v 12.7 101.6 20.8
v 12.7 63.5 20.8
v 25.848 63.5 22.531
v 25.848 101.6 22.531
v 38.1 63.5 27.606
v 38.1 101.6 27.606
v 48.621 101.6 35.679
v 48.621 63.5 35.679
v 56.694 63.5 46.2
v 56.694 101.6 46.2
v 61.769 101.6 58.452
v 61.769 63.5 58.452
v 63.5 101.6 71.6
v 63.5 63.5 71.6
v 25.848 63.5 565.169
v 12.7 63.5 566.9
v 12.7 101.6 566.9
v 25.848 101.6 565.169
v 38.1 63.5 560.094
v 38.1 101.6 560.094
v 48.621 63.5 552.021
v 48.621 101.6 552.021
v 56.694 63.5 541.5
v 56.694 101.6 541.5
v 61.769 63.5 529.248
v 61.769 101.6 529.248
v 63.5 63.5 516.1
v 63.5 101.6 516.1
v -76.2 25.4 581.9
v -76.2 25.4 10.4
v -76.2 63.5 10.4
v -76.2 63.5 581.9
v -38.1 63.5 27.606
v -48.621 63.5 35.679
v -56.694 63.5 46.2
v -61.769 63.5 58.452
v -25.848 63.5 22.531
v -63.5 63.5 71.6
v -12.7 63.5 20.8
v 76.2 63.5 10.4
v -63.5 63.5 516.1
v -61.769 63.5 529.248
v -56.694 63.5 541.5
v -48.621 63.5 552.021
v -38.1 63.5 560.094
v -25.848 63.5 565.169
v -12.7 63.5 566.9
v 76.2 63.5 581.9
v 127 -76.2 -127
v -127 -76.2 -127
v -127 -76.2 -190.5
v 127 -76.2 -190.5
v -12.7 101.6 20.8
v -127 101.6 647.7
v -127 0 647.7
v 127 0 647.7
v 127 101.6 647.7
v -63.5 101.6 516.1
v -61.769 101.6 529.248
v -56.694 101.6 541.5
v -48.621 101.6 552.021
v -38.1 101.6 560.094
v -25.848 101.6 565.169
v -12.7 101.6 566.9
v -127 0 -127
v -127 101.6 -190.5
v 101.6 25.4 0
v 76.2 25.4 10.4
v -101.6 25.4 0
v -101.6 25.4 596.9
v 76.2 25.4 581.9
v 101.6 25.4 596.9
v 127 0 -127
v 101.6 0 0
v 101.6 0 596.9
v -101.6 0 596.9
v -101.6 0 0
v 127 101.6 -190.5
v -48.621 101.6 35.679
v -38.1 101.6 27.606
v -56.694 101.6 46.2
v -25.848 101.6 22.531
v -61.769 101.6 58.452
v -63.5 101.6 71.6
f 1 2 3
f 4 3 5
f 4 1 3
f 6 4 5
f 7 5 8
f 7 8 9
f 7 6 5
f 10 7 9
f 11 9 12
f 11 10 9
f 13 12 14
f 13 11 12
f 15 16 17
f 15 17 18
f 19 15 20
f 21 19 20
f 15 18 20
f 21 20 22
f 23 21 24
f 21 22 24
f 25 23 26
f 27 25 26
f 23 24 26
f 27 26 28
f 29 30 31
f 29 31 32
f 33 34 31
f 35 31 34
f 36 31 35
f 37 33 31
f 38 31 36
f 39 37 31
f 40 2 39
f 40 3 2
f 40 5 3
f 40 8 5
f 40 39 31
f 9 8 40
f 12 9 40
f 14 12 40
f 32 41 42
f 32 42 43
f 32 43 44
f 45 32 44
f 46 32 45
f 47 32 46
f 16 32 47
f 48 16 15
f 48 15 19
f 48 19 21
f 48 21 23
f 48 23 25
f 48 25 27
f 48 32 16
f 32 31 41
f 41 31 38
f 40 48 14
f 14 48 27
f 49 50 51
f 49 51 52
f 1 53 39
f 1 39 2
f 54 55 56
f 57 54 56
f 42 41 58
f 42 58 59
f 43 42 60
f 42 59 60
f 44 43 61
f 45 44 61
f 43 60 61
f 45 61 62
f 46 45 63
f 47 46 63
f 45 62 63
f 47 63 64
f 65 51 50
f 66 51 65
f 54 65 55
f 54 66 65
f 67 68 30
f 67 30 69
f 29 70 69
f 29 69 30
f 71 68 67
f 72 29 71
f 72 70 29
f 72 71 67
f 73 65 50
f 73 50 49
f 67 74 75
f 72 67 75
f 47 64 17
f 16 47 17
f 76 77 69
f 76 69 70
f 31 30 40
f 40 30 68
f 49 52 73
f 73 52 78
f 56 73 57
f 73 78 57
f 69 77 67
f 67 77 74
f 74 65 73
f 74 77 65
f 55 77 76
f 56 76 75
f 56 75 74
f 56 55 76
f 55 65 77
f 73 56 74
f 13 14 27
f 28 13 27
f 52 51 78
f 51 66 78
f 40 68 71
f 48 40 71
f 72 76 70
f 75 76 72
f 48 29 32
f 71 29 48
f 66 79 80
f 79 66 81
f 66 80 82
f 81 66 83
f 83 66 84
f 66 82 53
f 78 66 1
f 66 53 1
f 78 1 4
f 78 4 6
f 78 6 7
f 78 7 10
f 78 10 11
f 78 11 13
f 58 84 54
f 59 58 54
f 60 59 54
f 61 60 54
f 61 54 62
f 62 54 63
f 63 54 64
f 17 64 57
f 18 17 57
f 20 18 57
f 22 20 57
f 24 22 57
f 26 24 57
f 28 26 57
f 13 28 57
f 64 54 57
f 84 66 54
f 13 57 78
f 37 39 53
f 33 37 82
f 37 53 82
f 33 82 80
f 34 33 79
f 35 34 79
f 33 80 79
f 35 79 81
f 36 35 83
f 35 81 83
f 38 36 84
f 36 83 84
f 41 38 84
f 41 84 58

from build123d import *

# Parameters (mm, degrees)
F0_W     = 254
F0_H     = 774.7
F0_W_2   = 203.2
F0_H_2   = 596.9
F0_W_3   = 152.4
F0_H_3   = 571.5
F0_W_4   = 127
F0_H_4   = 546.1
F0_H_5   = 63.5
F1_DEPTH = 101.6
F2_DEPTH = 25.4
F3_DEPTH = 63.5
F4_R     = 50.8
F5_DEPTH = 76.2


# Not quite as in the source:
# - a feature names something its author has since deleted; it is built from what else it names


with BuildPart() as f1:
    # F0 (on Front) → F1 (new body)
    with BuildSketch(Plane.XZ):
        with Locations((0, 260.35)):
            Rectangle(F0_W, F0_H)
        with Locations((0, 298.45)):
            Rectangle(F0_W_2, F0_H_2, mode=Mode.SUBTRACT)
        with Locations((0, 298.45)):
            Rectangle(F0_W_2, F0_H_2)
        with Locations((0, 296.15)):
            Rectangle(F0_W_3, F0_H_3, mode=Mode.SUBTRACT)
        with Locations((0, 296.15)):
            Rectangle(F0_W_3, F0_H_3)
        with Locations((0, 293.85)):
            Rectangle(F0_W_4, F0_H_4, mode=Mode.SUBTRACT)
        with Locations((0, -158.75)):
            Rectangle(F0_W, F0_H_5)
    extrude(amount=-F1_DEPTH)

    # F0 (on Front) → F2 (cut)
    with BuildSketch(Plane.XZ):
        with Locations((0, 298.45)):
            Rectangle(F0_W_2, F0_H_2)
        with Locations((0, 296.15)):
            Rectangle(F0_W_3, F0_H_3, mode=Mode.SUBTRACT)
    extrude(amount=-F2_DEPTH, mode=Mode.SUBTRACT)

    # F0 (on Front) → F3 (cut)
    with BuildSketch(Plane.XZ):
        with Locations((0, 296.15)):
            Rectangle(F0_W_3, F0_H_3)
        with Locations((0, 293.85)):
            Rectangle(F0_W_4, F0_H_4, mode=Mode.SUBTRACT)
    extrude(amount=-F3_DEPTH, mode=Mode.SUBTRACT)

    # F4
    f4_edges = [f1.edges().sort_by_distance(p)[0] for p in [
        (63.5, 82.55, 566.9),
        (-63.5, 82.55, 566.9),
        (-63.5, 82.55, 20.8),
        (63.5, 82.55, 20.8),
    ]]
    fillet(f4_edges, radius=F4_R)

    # F0 (on Front) → F5 (join)
    with BuildSketch(Plane.XZ):
        with Locations((0, -158.75)):
            Rectangle(F0_W, F0_H_5)
    extrude(amount=F5_DEPTH)


solid = f1.part
